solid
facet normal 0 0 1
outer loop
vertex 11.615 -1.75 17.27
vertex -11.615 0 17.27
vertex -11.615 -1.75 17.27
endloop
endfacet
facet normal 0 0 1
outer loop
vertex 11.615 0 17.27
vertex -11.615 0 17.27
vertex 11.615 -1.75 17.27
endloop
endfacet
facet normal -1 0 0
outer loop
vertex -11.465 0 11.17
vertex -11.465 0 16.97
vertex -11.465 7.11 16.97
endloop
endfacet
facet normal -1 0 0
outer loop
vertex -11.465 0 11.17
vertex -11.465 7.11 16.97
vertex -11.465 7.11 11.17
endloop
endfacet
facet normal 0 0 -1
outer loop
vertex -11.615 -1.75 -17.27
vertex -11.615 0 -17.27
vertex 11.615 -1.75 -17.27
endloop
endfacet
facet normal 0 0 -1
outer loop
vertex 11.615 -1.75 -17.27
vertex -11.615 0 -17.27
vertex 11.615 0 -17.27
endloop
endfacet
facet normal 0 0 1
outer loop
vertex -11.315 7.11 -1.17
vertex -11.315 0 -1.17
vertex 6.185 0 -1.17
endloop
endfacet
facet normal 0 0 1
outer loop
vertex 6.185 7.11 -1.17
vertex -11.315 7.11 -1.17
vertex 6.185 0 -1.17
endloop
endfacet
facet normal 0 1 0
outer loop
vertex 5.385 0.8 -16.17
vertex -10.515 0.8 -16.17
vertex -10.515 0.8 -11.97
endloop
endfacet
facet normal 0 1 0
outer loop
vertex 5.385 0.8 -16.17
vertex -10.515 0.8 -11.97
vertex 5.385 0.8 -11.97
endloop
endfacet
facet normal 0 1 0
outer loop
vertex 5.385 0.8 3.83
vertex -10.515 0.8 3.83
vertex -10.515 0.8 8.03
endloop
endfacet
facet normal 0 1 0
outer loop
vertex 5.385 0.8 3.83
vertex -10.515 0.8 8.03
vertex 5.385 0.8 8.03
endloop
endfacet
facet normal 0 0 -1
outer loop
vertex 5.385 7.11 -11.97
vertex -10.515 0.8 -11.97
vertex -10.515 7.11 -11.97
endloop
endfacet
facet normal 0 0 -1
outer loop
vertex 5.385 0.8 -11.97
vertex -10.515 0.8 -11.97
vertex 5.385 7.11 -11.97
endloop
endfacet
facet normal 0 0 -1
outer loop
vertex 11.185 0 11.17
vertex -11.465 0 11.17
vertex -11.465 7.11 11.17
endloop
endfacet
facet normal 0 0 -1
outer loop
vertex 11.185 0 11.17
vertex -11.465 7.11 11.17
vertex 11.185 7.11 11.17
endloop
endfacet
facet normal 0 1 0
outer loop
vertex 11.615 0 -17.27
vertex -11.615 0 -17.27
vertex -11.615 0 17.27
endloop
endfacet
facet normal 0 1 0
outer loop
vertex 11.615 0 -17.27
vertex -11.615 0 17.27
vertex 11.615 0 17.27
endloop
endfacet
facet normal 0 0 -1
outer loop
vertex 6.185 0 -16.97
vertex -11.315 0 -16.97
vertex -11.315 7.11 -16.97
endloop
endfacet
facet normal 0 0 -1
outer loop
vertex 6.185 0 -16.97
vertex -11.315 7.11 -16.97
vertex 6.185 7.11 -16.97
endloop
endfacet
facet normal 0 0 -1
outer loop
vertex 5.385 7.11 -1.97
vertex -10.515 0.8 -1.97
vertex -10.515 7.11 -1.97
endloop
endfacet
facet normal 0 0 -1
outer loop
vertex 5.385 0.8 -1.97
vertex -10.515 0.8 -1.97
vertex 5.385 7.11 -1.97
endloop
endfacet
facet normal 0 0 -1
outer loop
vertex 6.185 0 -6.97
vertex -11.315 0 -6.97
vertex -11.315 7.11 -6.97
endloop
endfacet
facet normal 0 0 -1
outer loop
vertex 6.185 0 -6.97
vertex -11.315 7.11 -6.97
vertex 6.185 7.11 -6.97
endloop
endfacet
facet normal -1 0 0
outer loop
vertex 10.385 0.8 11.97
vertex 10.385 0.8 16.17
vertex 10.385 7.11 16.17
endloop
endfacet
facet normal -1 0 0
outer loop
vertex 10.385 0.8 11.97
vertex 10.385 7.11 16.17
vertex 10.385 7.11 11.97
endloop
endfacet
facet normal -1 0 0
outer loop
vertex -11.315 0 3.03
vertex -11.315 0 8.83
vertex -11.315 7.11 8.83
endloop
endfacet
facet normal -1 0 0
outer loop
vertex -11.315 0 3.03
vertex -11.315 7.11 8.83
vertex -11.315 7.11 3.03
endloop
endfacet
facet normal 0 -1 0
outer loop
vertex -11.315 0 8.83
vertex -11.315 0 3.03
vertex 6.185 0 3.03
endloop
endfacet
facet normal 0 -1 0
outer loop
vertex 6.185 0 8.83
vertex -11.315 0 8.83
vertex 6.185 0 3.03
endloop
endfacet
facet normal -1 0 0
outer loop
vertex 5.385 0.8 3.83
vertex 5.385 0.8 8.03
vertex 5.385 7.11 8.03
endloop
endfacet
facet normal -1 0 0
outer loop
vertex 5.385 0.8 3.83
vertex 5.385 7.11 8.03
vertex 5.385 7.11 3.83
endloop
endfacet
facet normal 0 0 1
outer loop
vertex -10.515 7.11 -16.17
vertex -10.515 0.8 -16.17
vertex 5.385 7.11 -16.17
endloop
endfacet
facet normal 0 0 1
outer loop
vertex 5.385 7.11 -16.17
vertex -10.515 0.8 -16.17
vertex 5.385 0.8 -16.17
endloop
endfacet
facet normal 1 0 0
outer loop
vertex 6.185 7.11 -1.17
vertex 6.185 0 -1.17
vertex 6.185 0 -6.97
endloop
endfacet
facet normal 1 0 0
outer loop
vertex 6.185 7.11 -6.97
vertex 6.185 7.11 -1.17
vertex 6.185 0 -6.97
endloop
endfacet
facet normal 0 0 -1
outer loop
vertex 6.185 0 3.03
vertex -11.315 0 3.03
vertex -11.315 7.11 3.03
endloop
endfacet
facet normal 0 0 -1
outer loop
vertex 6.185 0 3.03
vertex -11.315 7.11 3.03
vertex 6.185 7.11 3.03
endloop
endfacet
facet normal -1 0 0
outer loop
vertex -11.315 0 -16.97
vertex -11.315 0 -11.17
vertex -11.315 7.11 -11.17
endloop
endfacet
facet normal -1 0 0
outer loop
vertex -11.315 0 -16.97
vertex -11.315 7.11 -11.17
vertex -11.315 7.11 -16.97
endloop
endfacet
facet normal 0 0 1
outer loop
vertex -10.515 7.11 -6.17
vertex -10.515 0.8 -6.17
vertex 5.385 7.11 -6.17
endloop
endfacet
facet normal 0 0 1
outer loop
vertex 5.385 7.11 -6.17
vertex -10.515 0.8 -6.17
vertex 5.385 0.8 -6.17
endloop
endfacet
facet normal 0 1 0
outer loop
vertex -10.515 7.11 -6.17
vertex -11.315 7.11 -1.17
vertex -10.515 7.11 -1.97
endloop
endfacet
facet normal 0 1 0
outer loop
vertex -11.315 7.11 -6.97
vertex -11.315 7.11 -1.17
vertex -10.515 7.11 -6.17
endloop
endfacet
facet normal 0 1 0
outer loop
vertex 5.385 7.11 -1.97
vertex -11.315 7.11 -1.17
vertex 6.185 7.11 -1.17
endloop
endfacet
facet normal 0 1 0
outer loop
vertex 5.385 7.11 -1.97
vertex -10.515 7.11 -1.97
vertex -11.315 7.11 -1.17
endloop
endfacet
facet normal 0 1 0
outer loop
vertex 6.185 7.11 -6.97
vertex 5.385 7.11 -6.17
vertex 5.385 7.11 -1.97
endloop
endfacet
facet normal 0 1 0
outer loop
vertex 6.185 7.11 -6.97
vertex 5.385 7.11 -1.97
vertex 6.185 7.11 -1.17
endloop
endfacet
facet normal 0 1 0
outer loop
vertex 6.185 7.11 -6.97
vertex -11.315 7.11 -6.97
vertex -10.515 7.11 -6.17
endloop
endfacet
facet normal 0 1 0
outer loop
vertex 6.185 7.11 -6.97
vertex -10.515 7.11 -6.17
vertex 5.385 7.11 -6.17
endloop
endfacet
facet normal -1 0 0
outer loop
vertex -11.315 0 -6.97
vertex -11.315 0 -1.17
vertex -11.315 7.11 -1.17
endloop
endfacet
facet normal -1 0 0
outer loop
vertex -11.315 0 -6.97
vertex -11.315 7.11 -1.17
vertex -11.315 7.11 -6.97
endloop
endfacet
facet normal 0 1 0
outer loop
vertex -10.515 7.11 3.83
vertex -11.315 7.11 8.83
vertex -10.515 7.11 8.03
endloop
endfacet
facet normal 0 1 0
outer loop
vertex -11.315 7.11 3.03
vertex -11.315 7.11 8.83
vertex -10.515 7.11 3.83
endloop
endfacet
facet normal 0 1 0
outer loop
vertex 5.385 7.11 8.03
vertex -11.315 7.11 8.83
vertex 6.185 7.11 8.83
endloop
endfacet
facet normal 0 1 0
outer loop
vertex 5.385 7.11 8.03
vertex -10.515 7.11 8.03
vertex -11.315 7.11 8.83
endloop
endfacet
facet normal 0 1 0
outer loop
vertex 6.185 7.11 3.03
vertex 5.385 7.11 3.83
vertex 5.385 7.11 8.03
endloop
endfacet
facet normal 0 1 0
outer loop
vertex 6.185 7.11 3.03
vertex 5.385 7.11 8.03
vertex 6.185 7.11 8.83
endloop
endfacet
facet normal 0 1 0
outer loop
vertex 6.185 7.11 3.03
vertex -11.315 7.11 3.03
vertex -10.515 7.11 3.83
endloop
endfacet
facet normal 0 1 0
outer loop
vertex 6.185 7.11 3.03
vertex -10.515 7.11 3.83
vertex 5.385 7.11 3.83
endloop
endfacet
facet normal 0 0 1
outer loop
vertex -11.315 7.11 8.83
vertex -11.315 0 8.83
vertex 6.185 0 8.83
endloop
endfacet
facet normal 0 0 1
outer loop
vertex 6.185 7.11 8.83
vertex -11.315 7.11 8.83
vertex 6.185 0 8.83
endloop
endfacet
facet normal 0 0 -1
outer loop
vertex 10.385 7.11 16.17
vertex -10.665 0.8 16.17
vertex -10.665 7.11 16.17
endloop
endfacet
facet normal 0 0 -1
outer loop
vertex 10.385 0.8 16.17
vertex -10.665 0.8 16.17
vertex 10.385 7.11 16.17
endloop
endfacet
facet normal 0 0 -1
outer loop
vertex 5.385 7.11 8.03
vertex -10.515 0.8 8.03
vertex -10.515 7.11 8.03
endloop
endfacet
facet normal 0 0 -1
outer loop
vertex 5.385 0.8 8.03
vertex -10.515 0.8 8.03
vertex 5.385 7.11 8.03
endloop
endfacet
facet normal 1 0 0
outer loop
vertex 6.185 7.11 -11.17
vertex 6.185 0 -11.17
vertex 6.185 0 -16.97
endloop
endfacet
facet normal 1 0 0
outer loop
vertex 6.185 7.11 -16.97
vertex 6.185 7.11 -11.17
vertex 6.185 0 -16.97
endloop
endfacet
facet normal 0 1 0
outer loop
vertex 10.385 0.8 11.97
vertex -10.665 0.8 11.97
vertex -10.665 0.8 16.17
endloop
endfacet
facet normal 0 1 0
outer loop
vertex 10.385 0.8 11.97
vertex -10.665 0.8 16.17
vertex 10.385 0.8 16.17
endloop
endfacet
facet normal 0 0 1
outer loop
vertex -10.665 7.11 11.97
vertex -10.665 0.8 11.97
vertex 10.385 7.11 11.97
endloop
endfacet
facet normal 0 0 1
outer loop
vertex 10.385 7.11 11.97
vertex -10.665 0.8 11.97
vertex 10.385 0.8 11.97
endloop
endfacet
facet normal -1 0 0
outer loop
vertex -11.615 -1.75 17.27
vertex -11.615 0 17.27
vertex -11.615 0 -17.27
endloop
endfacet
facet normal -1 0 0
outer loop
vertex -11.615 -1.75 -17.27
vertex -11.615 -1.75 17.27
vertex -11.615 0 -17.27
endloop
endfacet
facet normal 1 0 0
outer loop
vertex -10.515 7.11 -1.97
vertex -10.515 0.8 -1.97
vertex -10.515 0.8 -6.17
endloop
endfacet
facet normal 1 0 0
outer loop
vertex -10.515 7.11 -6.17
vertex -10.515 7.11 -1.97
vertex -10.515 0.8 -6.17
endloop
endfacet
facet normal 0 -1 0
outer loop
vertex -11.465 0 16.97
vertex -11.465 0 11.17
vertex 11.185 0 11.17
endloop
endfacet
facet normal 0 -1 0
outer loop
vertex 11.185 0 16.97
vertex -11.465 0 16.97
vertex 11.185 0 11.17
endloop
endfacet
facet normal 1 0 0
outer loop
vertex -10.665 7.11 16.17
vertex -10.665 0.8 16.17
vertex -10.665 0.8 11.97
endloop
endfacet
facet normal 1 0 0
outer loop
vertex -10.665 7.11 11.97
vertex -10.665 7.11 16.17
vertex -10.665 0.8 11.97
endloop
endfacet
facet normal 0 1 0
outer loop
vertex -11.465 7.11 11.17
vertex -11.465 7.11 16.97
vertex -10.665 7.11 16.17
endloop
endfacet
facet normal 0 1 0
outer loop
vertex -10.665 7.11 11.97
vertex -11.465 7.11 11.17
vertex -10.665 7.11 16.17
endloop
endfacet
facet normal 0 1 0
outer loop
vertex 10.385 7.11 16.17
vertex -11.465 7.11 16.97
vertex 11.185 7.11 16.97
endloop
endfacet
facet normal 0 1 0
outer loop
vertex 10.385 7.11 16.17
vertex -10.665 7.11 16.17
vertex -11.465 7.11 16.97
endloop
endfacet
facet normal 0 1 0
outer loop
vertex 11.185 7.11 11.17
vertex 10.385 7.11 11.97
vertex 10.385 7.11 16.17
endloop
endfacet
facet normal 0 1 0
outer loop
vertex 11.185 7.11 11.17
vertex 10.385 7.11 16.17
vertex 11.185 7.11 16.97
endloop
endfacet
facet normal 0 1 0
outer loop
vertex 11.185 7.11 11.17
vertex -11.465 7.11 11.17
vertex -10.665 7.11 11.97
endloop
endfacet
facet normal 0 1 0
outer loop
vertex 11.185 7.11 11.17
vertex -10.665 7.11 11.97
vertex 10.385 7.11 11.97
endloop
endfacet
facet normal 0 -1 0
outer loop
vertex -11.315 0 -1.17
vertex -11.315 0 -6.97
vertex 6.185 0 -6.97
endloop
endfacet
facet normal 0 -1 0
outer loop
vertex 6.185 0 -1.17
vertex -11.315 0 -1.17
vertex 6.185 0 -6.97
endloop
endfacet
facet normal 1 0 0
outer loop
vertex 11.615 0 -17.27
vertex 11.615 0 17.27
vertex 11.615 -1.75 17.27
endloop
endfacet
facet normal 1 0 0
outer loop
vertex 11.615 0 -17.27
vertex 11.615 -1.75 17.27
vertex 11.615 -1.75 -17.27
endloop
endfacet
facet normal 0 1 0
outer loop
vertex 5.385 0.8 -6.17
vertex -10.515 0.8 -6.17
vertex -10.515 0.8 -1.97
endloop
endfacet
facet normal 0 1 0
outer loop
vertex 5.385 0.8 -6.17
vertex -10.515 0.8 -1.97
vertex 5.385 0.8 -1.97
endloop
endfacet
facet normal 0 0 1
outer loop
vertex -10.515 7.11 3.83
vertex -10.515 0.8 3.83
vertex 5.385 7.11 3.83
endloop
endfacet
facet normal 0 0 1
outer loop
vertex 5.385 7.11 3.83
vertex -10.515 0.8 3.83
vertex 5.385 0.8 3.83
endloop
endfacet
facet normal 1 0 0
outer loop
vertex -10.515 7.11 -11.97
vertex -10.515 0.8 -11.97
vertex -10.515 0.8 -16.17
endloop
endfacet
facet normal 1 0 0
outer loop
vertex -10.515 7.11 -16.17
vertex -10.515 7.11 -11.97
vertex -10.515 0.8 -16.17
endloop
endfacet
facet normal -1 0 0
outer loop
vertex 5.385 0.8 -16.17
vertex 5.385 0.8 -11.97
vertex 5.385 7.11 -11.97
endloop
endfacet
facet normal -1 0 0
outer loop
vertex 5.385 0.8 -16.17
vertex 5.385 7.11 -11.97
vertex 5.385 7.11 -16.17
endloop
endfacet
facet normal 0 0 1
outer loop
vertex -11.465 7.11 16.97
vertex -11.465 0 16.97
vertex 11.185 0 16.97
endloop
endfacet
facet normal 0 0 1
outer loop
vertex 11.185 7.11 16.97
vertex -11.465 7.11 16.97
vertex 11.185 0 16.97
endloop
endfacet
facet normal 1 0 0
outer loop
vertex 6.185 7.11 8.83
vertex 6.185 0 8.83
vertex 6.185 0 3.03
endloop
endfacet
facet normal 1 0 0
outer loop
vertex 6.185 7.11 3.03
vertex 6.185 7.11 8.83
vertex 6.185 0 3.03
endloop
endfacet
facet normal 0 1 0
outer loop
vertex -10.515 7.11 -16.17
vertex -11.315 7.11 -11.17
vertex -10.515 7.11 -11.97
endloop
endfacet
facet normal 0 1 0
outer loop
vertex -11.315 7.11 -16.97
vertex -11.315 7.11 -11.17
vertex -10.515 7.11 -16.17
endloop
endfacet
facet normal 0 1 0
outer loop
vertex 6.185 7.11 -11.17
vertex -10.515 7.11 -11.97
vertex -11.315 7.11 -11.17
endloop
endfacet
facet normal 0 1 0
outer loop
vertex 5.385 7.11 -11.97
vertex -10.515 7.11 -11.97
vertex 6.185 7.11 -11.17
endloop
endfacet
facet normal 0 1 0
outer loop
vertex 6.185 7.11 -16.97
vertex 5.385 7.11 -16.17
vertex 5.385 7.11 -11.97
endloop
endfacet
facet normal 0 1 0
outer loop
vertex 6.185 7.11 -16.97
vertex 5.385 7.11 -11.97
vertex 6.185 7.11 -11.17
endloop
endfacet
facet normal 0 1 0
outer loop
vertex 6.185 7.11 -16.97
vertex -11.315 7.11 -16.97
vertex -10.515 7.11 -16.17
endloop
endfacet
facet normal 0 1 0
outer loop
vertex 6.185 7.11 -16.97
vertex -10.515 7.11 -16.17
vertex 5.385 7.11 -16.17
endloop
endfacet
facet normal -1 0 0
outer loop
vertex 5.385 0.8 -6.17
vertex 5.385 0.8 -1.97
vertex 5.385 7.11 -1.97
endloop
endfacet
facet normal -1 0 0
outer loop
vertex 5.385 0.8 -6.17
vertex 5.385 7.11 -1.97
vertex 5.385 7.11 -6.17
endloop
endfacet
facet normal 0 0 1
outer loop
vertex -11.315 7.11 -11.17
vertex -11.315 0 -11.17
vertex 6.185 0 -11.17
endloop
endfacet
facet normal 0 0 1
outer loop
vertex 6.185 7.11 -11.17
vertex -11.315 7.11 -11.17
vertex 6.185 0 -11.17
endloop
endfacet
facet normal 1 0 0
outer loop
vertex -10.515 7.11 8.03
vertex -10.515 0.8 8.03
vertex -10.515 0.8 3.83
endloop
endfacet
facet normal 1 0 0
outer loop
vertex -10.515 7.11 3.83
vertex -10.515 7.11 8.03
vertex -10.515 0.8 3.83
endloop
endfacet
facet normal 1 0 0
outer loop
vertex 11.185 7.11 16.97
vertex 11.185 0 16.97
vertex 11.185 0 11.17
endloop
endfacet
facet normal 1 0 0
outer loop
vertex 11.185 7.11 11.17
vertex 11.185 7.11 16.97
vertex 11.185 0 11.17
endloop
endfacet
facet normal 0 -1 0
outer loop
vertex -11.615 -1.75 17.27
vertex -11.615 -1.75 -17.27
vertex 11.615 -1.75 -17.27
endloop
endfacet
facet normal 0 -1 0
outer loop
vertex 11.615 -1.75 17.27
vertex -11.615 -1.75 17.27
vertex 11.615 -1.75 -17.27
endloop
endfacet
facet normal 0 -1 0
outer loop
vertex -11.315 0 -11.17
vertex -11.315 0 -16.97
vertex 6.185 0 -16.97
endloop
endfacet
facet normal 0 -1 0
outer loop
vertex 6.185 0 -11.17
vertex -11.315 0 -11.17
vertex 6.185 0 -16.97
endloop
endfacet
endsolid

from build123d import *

# Parameters (mm, degrees)
SKETCH2_W           = 23.23
SKETCH2_H           = 34.54
BOSS_EXTRUDE1_DEPTH = 1.75
SKETCH3_W           = 17.5
SKETCH3_H           = 5.8
BOSS_EXTRUDE2_DEPTH = 7.11
SHELL2_T            = -0.8
LPATTERN1_COUNT     = 3
LPATTERN1_PITCH     = 10
SKETCH4_W           = 22.65
SKETCH4_H           = 5.8
BOSS_EXTRUDE3_DEPTH = 7.11
SHELL3_T            = -0.8
SHELL4_T            = -0.8
SHELL5_T            = -0.8


with BuildPart() as part:
    # Sketch2 → Boss-Extrude1 (new body)
    with BuildSketch(Plane(origin=(0, 0, 0), x_dir=(1, 0, 0), z_dir=(0, 1, 0))):
        Rectangle(SKETCH2_W, SKETCH2_H)
    extrude(amount=-BOSS_EXTRUDE1_DEPTH)


with BuildPart() as body_2:
    # Sketch3 → Boss-Extrude2 (new body)
    with BuildSketch(Plane(origin=(0, 0, 0), x_dir=(1, 0, 0), z_dir=(0, 1, 0))):
        with Locations((-2.565, 14.07)):
            Rectangle(SKETCH3_W, SKETCH3_H)
    boss_extrude2 = extrude(amount=BOSS_EXTRUDE2_DEPTH)

    # Shell2
    shell2_openings = [body_2.faces().sort_by_distance(p)[0] for p in [
        (-2.565, 7.11, -14.07),
    ]]
    offset(amount=SHELL2_T, openings=shell2_openings, kind=Kind.INTERSECTION)


with BuildPart() as lpattern1_1:
    # LPattern1: pattern copy
    add(boss_extrude2.moved(Location(Vector(0, 0, 1) * (1 * LPATTERN1_PITCH))))

    # Shell3
    shell3_openings = [lpattern1_1.faces().sort_by_distance(p)[0] for p in [
        (-2.565, 7.11, -4.07),
    ]]
    offset(amount=SHELL3_T, openings=shell3_openings, kind=Kind.INTERSECTION)


with BuildPart() as lpattern1_2:
    # LPattern1: pattern copy
    add(boss_extrude2.moved(Location(Vector(0, 0, 1) * (2 * LPATTERN1_PITCH))))

    # Shell4
    shell4_openings = [lpattern1_2.faces().sort_by_distance(p)[0] for p in [
        (-2.565, 7.11, 5.93),
    ]]
    offset(amount=SHELL4_T, openings=shell4_openings, kind=Kind.INTERSECTION)


with BuildPart() as body_5:
    # Sketch4 → Boss-Extrude3 (new body)
    with BuildSketch(Plane(origin=(0, 0, 0), x_dir=(1, 0, 0), z_dir=(0, 1, 0))):
        with Locations((-0.14, -14.07)):
            Rectangle(SKETCH4_W, SKETCH4_H)
    extrude(amount=BOSS_EXTRUDE3_DEPTH)

    # Shell5
    shell5_openings = [body_5.faces().sort_by_distance(p)[0] for p in [
        (-0.14, 7.11, 14.07),
    ]]
    offset(amount=SHELL5_T, openings=shell5_openings, kind=Kind.INTERSECTION)


solid = Compound([part.part, body_2.part, lpattern1_1.part, lpattern1_2.part, body_5.part])
